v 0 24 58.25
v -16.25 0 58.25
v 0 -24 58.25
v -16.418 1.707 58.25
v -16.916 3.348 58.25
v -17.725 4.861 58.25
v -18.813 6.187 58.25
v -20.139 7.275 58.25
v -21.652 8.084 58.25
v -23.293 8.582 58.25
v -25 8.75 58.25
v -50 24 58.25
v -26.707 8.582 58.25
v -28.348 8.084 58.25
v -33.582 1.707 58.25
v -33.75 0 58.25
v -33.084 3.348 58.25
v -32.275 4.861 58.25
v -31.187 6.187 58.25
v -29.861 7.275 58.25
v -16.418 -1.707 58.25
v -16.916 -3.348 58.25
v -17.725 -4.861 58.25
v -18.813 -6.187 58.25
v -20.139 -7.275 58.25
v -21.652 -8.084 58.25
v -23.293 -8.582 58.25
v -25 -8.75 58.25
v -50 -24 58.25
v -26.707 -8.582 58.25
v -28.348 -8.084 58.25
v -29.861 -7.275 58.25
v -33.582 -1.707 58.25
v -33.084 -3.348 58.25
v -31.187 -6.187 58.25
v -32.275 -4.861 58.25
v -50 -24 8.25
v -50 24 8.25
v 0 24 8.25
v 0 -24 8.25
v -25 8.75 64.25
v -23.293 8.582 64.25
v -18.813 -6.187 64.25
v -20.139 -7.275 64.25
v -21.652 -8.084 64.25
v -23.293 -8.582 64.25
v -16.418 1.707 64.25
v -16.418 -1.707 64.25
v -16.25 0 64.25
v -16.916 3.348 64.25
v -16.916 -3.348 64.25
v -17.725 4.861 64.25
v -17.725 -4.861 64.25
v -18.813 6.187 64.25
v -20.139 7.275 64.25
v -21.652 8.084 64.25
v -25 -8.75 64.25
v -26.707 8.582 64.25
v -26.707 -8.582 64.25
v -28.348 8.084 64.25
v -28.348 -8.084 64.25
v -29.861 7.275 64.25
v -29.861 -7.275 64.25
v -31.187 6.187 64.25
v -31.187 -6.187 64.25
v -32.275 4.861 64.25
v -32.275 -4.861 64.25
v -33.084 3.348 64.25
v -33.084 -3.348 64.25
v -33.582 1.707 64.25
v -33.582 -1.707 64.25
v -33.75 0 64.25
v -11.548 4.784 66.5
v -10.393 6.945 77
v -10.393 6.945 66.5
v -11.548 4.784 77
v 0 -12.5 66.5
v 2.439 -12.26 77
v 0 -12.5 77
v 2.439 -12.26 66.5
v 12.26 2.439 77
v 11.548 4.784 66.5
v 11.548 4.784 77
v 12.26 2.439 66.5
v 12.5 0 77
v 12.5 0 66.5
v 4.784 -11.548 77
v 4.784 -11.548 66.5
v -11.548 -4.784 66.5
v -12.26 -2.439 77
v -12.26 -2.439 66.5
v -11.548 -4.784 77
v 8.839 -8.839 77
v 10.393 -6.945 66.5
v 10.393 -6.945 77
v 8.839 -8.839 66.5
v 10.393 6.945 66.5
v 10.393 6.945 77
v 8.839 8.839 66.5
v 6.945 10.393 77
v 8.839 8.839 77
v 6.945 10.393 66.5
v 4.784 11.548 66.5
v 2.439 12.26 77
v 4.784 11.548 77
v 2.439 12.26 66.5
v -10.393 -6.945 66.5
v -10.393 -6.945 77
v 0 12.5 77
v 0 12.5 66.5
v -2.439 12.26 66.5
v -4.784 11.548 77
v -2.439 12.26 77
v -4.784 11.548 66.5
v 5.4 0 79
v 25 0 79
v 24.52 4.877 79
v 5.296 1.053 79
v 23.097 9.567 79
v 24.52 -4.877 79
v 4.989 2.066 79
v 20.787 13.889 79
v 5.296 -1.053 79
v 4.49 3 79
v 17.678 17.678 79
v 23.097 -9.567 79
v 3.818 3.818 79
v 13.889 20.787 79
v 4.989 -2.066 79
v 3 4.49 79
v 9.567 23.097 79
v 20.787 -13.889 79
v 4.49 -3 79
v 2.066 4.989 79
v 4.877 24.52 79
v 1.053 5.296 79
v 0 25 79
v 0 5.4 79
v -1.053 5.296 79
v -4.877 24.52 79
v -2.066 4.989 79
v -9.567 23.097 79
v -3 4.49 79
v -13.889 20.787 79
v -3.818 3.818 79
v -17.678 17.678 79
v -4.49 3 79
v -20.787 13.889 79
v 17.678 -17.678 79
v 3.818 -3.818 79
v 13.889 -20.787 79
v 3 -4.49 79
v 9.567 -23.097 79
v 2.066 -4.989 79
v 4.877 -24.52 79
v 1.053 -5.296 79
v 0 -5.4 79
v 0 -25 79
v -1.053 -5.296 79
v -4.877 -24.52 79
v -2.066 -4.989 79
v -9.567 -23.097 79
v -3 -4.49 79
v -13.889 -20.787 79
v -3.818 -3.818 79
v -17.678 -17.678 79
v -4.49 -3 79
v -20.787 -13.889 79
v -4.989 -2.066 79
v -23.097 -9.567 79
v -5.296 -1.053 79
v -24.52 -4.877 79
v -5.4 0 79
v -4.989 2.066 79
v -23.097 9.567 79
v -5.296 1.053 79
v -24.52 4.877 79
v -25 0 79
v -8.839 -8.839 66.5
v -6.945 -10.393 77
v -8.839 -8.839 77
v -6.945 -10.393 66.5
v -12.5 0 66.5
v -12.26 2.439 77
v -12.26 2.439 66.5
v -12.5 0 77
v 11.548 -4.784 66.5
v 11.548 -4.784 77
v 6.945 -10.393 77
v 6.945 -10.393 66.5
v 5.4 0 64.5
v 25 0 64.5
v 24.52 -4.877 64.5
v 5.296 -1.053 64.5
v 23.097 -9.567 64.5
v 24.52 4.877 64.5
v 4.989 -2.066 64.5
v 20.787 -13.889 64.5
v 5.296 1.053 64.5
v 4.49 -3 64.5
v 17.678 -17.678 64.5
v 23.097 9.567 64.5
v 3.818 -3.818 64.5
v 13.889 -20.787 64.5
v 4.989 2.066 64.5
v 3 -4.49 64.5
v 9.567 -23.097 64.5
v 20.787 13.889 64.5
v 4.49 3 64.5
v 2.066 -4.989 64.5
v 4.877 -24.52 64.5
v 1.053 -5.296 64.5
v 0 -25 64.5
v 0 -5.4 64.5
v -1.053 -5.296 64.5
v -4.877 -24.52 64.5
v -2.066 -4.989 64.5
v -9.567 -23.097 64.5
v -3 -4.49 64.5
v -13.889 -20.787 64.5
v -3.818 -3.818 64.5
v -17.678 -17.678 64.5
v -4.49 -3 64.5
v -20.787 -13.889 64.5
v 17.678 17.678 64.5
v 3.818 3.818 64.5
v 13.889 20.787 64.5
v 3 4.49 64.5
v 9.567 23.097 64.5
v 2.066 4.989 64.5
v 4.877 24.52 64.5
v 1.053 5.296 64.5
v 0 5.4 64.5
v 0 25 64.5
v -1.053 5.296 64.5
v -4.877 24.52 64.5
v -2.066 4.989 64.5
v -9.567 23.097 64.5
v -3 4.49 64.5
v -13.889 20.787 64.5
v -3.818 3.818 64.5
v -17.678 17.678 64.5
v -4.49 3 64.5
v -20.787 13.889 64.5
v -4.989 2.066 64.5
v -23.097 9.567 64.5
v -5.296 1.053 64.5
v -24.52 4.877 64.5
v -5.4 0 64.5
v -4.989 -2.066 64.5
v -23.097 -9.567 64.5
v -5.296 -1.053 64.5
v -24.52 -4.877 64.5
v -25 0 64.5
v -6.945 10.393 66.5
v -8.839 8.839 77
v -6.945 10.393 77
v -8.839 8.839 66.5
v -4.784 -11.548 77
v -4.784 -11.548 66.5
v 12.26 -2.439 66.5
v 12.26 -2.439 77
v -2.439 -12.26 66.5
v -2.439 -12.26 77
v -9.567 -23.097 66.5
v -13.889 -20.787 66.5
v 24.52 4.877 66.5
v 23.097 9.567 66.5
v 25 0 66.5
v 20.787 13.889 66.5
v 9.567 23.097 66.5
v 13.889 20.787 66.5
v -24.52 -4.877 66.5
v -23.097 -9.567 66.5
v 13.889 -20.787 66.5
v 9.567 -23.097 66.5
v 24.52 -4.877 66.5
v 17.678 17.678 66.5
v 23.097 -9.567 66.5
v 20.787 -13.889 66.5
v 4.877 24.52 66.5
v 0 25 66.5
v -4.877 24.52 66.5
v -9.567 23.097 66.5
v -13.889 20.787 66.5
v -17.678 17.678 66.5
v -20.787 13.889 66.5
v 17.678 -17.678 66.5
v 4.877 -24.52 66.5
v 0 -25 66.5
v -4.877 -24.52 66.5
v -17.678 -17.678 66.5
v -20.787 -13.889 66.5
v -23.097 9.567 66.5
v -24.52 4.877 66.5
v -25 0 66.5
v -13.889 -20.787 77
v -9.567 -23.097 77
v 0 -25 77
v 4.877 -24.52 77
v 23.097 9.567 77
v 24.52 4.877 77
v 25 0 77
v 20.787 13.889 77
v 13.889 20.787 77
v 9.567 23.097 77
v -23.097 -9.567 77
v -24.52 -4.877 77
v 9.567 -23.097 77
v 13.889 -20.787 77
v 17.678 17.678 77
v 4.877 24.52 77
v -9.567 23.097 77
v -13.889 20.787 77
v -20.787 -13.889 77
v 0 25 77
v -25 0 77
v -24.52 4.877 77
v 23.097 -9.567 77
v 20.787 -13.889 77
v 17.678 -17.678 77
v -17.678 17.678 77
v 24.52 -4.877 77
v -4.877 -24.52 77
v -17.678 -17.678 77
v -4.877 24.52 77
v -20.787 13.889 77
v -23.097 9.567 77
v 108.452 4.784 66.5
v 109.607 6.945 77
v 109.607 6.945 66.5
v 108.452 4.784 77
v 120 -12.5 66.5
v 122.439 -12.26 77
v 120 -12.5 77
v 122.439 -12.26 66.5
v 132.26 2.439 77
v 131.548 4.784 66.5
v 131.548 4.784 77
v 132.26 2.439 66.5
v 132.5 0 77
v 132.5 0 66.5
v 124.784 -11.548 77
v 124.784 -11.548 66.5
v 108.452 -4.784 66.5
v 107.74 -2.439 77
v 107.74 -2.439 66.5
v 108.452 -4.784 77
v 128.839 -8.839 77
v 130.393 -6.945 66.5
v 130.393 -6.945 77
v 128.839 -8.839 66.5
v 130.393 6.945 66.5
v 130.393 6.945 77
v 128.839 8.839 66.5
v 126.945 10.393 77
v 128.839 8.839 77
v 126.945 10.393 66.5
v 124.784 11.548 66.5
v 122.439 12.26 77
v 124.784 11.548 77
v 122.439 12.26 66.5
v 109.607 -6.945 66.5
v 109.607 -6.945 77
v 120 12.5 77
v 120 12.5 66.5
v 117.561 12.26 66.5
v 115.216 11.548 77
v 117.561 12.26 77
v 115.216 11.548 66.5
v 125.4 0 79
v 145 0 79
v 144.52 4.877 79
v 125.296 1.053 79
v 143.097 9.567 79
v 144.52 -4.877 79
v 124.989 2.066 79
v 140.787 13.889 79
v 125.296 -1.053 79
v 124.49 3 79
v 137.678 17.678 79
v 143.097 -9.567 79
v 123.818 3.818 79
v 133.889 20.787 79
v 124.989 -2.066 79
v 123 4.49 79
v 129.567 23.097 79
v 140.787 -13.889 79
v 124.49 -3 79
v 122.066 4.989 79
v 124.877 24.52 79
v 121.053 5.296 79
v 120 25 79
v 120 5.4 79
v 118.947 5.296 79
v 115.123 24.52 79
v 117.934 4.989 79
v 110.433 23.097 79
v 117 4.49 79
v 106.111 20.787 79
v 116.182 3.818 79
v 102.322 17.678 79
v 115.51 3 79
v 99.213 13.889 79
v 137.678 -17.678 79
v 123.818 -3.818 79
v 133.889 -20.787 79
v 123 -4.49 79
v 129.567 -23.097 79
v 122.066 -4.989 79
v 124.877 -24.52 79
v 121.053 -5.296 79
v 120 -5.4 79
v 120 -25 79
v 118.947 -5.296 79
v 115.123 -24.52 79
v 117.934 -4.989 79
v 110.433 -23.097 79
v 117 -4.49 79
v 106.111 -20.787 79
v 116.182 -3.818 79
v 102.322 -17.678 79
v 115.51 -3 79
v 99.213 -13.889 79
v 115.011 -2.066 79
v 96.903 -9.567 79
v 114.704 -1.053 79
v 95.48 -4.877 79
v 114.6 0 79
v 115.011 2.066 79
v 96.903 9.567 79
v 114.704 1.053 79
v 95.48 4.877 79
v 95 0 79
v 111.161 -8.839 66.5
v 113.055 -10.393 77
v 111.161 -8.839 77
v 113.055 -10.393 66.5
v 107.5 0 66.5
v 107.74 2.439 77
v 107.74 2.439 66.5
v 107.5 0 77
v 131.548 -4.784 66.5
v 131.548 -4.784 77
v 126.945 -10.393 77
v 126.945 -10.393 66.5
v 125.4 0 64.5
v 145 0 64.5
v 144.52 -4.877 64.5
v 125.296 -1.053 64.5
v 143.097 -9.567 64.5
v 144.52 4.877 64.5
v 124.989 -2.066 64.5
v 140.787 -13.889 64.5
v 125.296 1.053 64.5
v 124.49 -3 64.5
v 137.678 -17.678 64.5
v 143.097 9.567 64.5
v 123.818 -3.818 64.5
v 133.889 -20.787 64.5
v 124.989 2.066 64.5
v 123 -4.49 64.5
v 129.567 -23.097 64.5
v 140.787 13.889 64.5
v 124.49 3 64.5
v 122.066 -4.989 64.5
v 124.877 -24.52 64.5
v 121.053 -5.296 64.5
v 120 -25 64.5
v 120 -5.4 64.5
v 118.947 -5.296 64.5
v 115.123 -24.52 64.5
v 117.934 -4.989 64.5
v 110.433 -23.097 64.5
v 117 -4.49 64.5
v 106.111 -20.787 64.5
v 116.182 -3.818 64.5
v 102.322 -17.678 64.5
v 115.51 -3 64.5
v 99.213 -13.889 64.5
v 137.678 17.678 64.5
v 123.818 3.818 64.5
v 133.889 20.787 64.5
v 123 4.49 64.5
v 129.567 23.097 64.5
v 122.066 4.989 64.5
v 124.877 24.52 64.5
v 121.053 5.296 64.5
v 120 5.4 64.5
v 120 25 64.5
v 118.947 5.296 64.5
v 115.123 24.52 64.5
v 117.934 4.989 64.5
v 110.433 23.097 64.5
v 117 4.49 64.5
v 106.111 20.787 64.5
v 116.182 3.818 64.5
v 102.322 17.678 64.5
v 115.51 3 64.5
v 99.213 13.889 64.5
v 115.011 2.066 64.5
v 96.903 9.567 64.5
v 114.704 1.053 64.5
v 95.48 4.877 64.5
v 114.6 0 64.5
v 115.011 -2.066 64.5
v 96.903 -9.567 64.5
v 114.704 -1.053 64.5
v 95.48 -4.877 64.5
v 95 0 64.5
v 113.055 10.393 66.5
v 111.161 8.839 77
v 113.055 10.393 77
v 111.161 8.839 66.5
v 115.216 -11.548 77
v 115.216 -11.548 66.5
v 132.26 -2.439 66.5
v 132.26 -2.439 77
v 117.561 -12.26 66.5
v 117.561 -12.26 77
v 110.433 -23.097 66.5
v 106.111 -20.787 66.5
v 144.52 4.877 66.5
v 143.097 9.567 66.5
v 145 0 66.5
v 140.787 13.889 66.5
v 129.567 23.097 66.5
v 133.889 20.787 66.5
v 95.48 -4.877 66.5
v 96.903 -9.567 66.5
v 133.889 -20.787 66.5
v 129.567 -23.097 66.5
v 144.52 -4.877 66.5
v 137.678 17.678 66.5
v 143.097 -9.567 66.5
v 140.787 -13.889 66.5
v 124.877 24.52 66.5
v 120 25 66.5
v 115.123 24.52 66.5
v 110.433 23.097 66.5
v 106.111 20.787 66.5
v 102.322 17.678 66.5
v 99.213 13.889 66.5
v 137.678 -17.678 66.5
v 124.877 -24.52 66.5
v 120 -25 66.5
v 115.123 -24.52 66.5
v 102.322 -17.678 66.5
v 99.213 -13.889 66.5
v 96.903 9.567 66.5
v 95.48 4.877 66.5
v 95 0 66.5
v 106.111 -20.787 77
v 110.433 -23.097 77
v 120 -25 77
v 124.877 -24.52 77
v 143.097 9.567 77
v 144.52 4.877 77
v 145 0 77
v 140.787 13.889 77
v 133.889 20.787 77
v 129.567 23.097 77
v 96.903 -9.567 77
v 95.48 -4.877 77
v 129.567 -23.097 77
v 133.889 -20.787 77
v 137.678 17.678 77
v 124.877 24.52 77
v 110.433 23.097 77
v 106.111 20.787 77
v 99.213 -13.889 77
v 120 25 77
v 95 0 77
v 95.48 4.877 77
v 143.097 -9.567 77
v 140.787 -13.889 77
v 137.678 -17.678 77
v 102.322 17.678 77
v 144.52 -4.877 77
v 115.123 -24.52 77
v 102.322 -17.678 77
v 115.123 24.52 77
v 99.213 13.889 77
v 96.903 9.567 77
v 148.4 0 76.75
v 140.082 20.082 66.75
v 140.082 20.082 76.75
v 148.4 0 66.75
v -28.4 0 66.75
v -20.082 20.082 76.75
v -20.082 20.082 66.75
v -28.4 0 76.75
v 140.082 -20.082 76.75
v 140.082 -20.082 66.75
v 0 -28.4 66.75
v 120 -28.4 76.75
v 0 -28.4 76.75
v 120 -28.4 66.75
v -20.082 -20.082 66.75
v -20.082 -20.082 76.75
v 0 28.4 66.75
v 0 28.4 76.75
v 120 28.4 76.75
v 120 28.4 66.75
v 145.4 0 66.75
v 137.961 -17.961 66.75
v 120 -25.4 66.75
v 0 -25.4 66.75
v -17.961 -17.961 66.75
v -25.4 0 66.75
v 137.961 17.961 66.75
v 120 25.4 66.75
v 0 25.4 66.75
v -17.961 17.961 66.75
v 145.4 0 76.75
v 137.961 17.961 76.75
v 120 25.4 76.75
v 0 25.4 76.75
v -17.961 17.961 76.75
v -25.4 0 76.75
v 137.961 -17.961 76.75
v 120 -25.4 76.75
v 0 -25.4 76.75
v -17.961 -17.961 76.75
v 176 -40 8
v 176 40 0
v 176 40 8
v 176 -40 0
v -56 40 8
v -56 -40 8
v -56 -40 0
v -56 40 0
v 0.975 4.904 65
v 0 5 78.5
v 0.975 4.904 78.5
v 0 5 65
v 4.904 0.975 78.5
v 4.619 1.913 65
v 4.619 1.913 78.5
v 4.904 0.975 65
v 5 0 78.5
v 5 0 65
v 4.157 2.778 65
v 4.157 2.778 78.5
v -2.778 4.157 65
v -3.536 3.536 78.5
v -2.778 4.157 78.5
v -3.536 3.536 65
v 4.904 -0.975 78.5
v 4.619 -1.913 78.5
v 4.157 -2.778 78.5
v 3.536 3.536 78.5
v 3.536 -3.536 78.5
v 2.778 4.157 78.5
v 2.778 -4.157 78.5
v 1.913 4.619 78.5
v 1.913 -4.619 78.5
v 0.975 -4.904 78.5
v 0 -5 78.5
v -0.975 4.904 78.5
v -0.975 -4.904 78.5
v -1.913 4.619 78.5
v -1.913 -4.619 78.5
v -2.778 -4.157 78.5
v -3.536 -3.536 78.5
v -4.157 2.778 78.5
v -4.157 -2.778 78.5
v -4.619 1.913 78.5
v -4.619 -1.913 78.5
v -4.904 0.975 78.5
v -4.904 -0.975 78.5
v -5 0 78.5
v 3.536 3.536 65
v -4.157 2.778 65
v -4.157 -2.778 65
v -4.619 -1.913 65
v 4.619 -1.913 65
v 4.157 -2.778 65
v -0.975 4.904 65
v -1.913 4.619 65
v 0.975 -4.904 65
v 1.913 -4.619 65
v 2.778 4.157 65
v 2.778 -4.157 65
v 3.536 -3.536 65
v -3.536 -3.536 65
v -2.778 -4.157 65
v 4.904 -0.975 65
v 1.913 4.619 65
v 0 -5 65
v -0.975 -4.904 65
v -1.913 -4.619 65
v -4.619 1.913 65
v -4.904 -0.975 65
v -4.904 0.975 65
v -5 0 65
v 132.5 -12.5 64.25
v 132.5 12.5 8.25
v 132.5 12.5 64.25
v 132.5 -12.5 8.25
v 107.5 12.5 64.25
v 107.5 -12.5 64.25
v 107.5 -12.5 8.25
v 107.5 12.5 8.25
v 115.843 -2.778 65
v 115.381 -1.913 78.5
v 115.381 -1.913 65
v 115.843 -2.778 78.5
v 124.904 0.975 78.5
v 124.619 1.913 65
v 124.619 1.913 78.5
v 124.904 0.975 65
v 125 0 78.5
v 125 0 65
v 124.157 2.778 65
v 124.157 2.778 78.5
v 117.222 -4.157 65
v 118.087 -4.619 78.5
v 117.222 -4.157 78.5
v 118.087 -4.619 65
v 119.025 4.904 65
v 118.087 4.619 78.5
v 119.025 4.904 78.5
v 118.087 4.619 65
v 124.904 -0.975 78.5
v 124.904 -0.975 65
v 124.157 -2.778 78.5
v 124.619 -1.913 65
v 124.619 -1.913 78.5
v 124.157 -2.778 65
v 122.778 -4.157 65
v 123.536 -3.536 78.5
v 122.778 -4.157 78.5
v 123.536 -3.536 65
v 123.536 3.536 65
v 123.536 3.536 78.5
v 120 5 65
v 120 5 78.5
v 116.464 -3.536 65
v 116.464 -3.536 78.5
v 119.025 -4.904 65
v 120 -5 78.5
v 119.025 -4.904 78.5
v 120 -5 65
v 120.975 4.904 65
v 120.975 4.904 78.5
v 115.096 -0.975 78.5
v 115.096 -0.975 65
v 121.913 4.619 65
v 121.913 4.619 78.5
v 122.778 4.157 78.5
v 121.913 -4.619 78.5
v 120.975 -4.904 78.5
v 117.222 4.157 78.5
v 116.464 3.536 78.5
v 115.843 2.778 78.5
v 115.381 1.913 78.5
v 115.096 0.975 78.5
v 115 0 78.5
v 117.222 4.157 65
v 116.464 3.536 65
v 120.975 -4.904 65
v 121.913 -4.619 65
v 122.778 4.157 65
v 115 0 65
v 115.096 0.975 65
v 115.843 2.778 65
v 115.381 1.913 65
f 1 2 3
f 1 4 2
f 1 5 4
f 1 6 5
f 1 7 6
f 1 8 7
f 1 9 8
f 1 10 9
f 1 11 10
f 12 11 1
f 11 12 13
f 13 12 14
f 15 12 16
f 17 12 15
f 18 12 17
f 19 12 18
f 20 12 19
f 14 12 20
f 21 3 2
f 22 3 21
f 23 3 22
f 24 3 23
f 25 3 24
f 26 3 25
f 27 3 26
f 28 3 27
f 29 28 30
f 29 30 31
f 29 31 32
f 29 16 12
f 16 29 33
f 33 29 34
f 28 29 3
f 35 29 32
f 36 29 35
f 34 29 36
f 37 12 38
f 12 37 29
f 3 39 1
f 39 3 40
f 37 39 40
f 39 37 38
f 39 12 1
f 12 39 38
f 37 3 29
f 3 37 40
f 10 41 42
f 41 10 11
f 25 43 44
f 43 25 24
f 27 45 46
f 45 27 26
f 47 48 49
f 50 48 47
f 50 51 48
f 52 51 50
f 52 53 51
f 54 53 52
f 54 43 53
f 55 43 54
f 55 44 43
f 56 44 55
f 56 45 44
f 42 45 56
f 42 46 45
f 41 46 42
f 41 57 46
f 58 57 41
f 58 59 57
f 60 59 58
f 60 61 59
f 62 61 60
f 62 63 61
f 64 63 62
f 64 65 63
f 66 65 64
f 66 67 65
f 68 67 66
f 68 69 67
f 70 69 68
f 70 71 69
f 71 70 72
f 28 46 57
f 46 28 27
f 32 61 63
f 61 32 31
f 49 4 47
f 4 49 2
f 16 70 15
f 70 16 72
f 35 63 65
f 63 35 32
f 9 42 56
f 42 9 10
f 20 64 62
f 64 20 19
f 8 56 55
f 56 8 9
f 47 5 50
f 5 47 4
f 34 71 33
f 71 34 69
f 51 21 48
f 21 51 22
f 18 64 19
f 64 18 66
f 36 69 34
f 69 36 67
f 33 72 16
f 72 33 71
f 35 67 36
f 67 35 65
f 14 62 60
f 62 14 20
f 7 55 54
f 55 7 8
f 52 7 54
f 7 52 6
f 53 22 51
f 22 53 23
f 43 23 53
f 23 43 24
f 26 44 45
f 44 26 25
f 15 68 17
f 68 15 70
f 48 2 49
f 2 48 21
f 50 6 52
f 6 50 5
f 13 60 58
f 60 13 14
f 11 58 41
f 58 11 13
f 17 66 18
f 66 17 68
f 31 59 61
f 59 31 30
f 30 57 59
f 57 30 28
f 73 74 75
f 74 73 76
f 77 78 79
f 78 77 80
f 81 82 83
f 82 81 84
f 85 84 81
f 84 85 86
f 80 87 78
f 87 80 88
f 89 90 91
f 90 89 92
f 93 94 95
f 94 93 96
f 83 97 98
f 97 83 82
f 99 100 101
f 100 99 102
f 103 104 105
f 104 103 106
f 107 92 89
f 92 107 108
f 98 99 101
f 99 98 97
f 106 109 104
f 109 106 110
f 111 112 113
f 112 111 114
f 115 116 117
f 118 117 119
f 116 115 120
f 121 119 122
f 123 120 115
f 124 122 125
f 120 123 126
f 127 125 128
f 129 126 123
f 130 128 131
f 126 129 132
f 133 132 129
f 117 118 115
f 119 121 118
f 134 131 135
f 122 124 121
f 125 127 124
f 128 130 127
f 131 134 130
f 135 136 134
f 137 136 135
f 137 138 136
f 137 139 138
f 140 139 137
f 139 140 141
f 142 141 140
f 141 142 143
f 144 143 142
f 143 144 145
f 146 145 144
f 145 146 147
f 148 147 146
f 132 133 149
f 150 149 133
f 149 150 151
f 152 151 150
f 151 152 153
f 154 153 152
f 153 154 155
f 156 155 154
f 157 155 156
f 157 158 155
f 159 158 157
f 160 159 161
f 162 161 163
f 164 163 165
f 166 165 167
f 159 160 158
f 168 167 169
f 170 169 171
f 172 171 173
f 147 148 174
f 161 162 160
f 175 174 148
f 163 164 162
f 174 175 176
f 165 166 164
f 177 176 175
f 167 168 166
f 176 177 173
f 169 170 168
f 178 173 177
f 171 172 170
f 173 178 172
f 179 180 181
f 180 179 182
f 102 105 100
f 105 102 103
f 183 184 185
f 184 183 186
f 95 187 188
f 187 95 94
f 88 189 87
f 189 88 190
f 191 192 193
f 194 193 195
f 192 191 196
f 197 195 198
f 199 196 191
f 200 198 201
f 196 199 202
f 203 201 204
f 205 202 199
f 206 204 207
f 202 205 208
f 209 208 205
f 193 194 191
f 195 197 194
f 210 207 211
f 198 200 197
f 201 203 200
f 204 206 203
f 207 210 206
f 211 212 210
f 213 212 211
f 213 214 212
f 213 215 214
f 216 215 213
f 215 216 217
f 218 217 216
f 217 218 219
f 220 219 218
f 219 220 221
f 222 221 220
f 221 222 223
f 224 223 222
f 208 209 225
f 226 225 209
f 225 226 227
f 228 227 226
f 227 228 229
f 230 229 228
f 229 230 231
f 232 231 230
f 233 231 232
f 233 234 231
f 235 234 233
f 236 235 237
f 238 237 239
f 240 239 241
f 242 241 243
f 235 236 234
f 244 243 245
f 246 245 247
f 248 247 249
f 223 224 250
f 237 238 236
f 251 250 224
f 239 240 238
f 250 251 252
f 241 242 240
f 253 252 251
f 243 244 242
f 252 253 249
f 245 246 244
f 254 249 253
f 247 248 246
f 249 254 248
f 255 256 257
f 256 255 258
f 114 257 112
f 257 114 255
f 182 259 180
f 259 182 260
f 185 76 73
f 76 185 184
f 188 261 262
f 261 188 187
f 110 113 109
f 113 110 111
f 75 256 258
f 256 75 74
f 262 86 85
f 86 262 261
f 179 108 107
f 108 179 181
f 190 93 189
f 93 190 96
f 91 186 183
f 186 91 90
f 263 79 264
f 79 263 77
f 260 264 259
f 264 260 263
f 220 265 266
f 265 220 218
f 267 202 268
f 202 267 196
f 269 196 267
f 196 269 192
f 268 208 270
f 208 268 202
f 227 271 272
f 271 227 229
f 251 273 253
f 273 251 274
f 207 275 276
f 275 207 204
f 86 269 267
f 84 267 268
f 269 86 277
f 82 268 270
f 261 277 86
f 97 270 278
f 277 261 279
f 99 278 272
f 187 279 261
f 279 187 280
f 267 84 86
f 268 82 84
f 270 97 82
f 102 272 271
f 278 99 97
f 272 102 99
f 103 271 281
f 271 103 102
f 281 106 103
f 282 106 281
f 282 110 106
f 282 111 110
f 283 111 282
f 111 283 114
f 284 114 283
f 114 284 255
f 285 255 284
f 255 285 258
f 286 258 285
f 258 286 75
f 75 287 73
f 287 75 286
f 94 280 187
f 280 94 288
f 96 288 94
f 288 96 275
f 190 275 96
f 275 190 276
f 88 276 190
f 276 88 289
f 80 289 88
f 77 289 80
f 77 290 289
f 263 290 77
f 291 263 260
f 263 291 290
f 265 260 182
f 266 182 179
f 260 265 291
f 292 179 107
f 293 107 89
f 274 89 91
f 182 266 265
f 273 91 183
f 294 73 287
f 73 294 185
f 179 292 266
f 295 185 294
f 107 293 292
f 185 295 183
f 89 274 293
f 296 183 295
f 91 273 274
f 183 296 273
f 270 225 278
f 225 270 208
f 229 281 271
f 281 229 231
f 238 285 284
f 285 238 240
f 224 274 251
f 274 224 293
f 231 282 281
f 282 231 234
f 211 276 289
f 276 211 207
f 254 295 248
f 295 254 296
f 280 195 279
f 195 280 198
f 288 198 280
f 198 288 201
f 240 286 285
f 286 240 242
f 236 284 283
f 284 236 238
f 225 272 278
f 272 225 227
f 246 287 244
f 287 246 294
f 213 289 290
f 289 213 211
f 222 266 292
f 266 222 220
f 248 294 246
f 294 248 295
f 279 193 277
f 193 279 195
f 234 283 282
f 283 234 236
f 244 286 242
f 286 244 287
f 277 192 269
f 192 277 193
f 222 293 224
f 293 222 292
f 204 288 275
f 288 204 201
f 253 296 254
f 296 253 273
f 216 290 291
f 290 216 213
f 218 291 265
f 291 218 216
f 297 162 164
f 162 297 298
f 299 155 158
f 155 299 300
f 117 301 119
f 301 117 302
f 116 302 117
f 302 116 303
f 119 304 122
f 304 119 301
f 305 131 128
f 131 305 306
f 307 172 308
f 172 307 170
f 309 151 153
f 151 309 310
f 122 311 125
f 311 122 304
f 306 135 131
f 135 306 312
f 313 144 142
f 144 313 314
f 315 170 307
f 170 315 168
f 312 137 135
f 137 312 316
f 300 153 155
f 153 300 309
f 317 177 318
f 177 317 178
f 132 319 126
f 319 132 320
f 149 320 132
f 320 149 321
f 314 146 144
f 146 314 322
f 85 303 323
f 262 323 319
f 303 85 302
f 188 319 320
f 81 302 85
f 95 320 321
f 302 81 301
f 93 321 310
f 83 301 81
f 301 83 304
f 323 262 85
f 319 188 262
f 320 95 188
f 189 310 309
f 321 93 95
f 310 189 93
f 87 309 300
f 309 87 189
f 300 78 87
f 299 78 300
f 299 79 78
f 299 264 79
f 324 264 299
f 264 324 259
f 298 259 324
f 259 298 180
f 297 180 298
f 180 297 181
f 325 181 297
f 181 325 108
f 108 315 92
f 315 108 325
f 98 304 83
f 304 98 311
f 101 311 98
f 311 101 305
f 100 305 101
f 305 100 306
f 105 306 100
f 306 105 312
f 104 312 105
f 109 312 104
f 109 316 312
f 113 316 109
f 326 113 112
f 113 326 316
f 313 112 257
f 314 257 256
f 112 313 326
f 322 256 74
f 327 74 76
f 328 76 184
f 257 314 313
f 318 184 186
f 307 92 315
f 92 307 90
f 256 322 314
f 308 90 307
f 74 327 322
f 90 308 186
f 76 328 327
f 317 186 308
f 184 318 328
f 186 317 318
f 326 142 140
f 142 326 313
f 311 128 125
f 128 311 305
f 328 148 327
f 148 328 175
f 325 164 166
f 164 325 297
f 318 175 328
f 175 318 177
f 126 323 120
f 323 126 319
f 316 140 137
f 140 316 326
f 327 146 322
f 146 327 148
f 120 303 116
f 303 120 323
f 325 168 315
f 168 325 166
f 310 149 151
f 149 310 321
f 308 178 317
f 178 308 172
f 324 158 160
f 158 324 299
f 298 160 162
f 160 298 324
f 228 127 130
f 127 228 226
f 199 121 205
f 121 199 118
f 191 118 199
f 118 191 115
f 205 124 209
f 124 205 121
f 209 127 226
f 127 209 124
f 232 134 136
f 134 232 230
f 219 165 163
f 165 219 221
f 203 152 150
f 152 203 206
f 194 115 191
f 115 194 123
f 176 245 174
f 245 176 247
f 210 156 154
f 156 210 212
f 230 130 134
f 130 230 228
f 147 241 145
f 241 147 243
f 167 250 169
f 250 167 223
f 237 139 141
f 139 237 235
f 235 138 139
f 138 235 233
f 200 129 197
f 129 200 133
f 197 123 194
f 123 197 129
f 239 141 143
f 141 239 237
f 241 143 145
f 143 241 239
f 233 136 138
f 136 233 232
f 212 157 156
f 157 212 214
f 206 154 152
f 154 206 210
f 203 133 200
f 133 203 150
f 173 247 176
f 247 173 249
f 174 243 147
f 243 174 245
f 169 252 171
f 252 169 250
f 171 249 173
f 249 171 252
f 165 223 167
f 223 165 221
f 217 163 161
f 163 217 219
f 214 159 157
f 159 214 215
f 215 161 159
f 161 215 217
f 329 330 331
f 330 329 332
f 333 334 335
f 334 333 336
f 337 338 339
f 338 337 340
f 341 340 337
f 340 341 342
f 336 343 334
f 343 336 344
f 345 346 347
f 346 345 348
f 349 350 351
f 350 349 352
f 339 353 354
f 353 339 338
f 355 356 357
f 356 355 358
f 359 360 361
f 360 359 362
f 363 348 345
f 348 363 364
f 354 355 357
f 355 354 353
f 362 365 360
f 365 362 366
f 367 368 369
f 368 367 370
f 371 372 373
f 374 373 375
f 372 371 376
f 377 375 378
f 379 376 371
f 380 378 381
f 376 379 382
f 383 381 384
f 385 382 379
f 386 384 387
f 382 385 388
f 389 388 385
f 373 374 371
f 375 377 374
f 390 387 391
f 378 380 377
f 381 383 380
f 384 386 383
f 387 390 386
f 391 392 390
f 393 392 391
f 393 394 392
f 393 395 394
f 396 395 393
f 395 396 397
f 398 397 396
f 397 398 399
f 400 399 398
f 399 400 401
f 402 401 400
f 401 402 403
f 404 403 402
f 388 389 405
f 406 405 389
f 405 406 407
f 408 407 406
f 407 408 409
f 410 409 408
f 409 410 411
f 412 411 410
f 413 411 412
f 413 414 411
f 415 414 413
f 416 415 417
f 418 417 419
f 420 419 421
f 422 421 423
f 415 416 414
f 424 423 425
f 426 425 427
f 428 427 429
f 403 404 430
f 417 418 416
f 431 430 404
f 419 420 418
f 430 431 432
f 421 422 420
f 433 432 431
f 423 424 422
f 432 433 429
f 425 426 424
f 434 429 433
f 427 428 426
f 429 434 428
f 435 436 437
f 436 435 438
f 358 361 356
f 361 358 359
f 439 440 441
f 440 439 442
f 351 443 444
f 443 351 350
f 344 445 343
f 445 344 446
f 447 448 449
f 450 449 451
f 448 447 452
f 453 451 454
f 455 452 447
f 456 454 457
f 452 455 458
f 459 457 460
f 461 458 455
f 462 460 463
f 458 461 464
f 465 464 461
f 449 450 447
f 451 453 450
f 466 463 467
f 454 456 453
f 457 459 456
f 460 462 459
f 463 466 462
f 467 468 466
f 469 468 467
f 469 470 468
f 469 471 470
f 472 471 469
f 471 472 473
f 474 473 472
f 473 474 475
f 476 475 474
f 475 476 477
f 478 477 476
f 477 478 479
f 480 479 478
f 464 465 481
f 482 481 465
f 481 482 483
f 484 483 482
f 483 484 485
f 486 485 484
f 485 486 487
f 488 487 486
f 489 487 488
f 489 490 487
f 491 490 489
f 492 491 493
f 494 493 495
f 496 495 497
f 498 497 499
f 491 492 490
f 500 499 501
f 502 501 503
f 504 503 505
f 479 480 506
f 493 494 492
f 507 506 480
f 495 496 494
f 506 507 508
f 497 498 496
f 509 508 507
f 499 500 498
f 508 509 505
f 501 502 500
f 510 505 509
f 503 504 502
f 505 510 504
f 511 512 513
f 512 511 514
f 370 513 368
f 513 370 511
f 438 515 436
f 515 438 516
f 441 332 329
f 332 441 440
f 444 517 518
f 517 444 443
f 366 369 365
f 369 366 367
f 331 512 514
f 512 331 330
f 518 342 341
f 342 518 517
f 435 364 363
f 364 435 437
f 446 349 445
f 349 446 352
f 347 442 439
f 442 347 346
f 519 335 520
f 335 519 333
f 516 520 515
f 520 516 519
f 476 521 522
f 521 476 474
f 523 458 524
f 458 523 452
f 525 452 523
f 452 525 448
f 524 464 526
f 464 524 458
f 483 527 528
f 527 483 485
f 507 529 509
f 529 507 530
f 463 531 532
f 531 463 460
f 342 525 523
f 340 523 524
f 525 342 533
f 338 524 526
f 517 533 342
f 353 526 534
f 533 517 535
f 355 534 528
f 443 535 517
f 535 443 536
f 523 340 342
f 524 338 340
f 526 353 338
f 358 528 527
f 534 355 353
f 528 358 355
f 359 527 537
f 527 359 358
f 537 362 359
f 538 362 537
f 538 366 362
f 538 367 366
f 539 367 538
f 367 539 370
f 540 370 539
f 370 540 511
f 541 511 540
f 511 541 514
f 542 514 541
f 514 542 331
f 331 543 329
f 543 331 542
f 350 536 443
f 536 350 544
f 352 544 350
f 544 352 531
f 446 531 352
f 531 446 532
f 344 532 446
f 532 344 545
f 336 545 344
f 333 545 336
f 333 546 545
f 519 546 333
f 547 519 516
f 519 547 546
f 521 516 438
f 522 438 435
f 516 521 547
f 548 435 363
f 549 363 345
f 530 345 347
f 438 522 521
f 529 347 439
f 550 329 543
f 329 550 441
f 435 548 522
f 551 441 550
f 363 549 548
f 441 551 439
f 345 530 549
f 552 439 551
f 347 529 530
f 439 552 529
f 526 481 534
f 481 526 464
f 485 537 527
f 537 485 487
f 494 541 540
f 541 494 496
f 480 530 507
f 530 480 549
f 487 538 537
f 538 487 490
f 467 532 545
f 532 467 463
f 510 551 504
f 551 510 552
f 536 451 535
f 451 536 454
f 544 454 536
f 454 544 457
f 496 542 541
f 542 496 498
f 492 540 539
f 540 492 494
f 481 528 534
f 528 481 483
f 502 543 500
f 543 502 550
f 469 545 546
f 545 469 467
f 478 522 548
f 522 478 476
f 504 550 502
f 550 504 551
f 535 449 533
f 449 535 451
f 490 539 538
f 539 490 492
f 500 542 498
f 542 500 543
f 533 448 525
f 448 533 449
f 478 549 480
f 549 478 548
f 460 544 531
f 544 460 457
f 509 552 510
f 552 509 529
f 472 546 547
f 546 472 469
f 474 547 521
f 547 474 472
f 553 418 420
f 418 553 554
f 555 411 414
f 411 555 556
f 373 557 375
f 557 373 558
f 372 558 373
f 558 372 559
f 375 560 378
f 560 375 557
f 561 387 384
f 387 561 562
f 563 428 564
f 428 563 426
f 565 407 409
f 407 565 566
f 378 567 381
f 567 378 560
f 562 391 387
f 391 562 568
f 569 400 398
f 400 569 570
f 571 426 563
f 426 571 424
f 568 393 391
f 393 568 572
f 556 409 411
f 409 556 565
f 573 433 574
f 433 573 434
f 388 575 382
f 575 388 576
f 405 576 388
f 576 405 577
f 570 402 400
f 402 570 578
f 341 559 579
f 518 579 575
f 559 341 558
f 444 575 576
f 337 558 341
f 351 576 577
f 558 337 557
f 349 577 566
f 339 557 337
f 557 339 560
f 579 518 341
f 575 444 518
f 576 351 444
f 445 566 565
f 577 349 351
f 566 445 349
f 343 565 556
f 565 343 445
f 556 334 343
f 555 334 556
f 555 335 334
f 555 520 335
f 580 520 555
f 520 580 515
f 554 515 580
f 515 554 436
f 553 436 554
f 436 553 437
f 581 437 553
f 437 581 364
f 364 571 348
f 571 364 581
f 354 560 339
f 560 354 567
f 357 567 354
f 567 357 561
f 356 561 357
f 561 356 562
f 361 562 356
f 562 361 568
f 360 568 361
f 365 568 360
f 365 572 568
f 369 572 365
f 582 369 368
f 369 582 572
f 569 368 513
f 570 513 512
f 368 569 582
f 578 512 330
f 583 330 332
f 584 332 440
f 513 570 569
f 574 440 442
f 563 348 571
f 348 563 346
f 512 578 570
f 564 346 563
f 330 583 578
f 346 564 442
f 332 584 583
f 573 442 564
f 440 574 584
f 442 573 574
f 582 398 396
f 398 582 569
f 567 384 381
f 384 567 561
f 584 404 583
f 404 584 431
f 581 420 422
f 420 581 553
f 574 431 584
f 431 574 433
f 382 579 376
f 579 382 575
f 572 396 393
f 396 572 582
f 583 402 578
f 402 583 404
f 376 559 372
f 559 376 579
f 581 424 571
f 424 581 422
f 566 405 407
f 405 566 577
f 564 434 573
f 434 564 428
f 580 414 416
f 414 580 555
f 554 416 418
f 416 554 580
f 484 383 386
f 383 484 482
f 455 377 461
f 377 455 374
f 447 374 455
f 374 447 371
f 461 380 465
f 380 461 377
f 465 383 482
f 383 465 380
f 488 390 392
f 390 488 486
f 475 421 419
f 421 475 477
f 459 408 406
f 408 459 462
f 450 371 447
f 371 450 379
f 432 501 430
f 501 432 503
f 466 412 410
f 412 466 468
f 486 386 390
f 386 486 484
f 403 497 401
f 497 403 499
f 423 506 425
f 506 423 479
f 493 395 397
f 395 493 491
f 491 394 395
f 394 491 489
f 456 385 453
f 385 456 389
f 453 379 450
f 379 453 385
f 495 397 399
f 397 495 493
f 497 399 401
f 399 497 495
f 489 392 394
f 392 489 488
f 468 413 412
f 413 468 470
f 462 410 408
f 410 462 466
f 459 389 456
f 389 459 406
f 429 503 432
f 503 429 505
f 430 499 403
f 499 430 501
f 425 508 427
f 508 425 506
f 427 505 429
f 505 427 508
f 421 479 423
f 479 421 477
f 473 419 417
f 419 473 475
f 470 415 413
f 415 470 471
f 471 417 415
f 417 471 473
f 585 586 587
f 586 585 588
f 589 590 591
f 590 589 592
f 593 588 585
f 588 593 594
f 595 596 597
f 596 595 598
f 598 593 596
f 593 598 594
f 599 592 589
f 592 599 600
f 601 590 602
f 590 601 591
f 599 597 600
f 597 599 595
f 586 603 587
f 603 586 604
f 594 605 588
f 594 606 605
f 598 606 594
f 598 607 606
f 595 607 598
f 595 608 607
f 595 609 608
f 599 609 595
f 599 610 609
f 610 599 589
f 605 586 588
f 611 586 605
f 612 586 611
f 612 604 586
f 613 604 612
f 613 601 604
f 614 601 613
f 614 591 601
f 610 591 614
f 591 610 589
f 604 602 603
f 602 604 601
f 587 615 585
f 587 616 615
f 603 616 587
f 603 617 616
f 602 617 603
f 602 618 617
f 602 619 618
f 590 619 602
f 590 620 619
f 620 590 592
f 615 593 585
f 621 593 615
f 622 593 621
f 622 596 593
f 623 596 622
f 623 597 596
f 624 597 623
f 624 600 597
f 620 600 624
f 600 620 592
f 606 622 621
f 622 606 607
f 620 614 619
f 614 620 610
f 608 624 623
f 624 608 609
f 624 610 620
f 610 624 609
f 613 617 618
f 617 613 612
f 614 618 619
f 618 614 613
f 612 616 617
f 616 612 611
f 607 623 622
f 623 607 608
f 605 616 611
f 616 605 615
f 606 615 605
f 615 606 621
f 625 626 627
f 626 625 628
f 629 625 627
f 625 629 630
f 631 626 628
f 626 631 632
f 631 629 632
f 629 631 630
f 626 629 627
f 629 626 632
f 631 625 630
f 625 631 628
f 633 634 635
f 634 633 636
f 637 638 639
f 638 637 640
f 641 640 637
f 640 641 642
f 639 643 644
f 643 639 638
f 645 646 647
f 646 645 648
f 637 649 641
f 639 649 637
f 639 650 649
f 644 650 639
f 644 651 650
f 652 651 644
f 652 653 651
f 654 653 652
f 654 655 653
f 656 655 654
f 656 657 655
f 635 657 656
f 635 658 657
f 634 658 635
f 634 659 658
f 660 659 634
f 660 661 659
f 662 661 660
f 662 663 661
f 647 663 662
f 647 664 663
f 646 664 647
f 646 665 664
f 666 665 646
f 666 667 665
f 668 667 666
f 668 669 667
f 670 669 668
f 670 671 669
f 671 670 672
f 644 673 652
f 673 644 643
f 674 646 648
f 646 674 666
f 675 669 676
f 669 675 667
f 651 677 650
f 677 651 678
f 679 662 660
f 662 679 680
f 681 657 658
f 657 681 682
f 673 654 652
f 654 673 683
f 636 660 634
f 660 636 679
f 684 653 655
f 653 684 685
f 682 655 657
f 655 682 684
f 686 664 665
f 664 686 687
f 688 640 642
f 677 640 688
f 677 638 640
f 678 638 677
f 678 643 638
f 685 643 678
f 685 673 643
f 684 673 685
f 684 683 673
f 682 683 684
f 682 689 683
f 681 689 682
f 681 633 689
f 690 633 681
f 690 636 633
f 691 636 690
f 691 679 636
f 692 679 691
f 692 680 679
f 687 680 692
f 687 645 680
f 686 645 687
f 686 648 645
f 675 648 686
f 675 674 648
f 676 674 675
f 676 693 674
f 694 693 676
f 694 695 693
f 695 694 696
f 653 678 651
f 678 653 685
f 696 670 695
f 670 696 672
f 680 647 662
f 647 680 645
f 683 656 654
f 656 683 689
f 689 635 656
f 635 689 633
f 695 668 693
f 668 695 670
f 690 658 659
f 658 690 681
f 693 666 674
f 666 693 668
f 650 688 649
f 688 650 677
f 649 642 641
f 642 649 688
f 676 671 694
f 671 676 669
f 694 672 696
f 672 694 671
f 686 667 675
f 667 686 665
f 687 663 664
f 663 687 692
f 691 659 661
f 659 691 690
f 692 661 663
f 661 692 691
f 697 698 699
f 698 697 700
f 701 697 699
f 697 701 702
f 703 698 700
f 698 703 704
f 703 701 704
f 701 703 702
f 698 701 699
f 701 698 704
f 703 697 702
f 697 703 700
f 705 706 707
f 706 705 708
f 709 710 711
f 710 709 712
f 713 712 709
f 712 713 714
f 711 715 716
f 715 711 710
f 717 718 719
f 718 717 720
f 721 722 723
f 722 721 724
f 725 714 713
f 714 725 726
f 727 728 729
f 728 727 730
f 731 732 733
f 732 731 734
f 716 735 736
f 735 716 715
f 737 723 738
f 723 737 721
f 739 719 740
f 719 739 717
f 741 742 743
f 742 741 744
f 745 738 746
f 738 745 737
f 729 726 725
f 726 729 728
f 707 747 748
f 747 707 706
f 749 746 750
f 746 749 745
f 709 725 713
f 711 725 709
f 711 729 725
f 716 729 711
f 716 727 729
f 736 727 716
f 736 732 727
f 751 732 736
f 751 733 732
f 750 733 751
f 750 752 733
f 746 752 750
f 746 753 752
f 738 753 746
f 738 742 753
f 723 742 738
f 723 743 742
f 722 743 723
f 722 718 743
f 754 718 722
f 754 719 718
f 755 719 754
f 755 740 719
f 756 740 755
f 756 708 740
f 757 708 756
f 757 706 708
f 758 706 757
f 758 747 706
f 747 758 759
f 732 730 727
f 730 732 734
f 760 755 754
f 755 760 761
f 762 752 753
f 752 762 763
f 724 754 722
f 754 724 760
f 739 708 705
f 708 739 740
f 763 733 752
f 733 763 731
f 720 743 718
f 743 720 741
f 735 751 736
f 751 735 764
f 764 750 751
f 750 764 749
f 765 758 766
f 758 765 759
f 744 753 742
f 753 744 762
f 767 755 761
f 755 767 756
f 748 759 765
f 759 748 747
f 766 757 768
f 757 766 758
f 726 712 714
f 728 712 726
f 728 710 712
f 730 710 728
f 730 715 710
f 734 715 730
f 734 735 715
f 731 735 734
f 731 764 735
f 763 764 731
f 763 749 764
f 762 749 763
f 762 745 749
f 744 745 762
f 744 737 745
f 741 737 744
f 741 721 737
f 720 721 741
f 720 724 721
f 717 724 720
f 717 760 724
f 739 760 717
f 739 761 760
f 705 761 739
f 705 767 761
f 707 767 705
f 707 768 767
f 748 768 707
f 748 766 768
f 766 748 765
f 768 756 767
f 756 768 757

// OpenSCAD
$fn = 32;

// ------------------------------------------------------------------------
// Motor belt drive: span 120 mm, pulleys d50, belt 10 mm wide
// Every part is its own module, assembly() places every instance.
// ------------------------------------------------------------------------

// --- part 1 ---
module base_plate() {
  difference() {
    translate([-116, -40, 0]) cube([232, 80, 8]);
  }
}

// --- part 2 ---
module motor() {
  union() {
    translate([-25, -24, 0]) cube([50, 48, 50]);
    translate([28, 0, 25]) rotate([0, 90, 0]) cylinder(h = 6, d = 17.5, center = true);
  }
}

// --- part 3 ---
module drive_shaft() {
  translate([0, 0, -6.75]) cylinder(h = 13.5, d = 10);
}

// --- part 4 ---
module pulley_drive() {
  difference() {
    union() {
      cylinder(h = 14.5, d = 25);
      cylinder(h = 2, d = 50);
      translate([0, 0, 12.5]) cylinder(h = 2, d = 50);
    }
    translate([0, 0, -1]) cylinder(h = 16.5, d = 10.8);
  }
}

// --- part 5 ---
module idler_post() {
  translate([-12.5, -12.5, 0]) cube([25, 25, 56]);
}

// --- part 6 ---
module driven_shaft() {
  translate([0, 0, -6.75]) cylinder(h = 13.5, d = 10);
}

// --- part 7 ---
module pulley_driven() {
  difference() {
    union() {
      cylinder(h = 14.5, d = 25);
      cylinder(h = 2, d = 50);
      translate([0, 0, 12.5]) cylinder(h = 2, d = 50);
    }
    translate([0, 0, -1]) cylinder(h = 16.5, d = 10.8);
  }
}

// --- part 8 ---
module drive_belt() {
  difference() {
    linear_extrude(height = 10) polygon(points = concat([for (a = [90 : 45 : 270]) [28.4 * cos(a), 28.4 * sin(a)]], [for (a = [270 : 45 : 450]) [120 + 28.4 * cos(a), 28.4 * sin(a)]]));
    translate([0, 0, -1]) linear_extrude(height = 12) polygon(points = concat([for (a = [90 : 45 : 270]) [25.4 * cos(a), 25.4 * sin(a)]], [for (a = [270 : 45 : 450]) [120 + 25.4 * cos(a), 25.4 * sin(a)]]));
  }
}

// --- assembly ---
module assembly() {
  color([0.80, 0.24, 0.20]) translate([60, 0, 0]) rotate([0, 0, 0]) base_plate();
  color([0.20, 0.45, 0.75]) translate([0, 0, 33.25]) rotate([0, 270, 0]) motor();
  color([0.25, 0.62, 0.32]) translate([0, 0, 71.75]) rotate([0, 0, 0]) drive_shaft();
  color([0.92, 0.70, 0.18]) translate([0, 0, 64.5]) rotate([0, 0, 0]) pulley_drive();
  color([0.58, 0.35, 0.70]) translate([120, 0, 8.25]) rotate([0, 0, 0]) idler_post();
  color([0.16, 0.66, 0.66]) translate([120, 0, 71.75]) rotate([0, 0, 0]) driven_shaft();
  color([0.85, 0.48, 0.18]) translate([120, 0, 64.5]) rotate([0, 0, 0]) pulley_driven();
  color([0.55, 0.60, 0.65]) translate([0, 0, 66.75]) rotate([0, 0, 0]) drive_belt();
}

assembly();
